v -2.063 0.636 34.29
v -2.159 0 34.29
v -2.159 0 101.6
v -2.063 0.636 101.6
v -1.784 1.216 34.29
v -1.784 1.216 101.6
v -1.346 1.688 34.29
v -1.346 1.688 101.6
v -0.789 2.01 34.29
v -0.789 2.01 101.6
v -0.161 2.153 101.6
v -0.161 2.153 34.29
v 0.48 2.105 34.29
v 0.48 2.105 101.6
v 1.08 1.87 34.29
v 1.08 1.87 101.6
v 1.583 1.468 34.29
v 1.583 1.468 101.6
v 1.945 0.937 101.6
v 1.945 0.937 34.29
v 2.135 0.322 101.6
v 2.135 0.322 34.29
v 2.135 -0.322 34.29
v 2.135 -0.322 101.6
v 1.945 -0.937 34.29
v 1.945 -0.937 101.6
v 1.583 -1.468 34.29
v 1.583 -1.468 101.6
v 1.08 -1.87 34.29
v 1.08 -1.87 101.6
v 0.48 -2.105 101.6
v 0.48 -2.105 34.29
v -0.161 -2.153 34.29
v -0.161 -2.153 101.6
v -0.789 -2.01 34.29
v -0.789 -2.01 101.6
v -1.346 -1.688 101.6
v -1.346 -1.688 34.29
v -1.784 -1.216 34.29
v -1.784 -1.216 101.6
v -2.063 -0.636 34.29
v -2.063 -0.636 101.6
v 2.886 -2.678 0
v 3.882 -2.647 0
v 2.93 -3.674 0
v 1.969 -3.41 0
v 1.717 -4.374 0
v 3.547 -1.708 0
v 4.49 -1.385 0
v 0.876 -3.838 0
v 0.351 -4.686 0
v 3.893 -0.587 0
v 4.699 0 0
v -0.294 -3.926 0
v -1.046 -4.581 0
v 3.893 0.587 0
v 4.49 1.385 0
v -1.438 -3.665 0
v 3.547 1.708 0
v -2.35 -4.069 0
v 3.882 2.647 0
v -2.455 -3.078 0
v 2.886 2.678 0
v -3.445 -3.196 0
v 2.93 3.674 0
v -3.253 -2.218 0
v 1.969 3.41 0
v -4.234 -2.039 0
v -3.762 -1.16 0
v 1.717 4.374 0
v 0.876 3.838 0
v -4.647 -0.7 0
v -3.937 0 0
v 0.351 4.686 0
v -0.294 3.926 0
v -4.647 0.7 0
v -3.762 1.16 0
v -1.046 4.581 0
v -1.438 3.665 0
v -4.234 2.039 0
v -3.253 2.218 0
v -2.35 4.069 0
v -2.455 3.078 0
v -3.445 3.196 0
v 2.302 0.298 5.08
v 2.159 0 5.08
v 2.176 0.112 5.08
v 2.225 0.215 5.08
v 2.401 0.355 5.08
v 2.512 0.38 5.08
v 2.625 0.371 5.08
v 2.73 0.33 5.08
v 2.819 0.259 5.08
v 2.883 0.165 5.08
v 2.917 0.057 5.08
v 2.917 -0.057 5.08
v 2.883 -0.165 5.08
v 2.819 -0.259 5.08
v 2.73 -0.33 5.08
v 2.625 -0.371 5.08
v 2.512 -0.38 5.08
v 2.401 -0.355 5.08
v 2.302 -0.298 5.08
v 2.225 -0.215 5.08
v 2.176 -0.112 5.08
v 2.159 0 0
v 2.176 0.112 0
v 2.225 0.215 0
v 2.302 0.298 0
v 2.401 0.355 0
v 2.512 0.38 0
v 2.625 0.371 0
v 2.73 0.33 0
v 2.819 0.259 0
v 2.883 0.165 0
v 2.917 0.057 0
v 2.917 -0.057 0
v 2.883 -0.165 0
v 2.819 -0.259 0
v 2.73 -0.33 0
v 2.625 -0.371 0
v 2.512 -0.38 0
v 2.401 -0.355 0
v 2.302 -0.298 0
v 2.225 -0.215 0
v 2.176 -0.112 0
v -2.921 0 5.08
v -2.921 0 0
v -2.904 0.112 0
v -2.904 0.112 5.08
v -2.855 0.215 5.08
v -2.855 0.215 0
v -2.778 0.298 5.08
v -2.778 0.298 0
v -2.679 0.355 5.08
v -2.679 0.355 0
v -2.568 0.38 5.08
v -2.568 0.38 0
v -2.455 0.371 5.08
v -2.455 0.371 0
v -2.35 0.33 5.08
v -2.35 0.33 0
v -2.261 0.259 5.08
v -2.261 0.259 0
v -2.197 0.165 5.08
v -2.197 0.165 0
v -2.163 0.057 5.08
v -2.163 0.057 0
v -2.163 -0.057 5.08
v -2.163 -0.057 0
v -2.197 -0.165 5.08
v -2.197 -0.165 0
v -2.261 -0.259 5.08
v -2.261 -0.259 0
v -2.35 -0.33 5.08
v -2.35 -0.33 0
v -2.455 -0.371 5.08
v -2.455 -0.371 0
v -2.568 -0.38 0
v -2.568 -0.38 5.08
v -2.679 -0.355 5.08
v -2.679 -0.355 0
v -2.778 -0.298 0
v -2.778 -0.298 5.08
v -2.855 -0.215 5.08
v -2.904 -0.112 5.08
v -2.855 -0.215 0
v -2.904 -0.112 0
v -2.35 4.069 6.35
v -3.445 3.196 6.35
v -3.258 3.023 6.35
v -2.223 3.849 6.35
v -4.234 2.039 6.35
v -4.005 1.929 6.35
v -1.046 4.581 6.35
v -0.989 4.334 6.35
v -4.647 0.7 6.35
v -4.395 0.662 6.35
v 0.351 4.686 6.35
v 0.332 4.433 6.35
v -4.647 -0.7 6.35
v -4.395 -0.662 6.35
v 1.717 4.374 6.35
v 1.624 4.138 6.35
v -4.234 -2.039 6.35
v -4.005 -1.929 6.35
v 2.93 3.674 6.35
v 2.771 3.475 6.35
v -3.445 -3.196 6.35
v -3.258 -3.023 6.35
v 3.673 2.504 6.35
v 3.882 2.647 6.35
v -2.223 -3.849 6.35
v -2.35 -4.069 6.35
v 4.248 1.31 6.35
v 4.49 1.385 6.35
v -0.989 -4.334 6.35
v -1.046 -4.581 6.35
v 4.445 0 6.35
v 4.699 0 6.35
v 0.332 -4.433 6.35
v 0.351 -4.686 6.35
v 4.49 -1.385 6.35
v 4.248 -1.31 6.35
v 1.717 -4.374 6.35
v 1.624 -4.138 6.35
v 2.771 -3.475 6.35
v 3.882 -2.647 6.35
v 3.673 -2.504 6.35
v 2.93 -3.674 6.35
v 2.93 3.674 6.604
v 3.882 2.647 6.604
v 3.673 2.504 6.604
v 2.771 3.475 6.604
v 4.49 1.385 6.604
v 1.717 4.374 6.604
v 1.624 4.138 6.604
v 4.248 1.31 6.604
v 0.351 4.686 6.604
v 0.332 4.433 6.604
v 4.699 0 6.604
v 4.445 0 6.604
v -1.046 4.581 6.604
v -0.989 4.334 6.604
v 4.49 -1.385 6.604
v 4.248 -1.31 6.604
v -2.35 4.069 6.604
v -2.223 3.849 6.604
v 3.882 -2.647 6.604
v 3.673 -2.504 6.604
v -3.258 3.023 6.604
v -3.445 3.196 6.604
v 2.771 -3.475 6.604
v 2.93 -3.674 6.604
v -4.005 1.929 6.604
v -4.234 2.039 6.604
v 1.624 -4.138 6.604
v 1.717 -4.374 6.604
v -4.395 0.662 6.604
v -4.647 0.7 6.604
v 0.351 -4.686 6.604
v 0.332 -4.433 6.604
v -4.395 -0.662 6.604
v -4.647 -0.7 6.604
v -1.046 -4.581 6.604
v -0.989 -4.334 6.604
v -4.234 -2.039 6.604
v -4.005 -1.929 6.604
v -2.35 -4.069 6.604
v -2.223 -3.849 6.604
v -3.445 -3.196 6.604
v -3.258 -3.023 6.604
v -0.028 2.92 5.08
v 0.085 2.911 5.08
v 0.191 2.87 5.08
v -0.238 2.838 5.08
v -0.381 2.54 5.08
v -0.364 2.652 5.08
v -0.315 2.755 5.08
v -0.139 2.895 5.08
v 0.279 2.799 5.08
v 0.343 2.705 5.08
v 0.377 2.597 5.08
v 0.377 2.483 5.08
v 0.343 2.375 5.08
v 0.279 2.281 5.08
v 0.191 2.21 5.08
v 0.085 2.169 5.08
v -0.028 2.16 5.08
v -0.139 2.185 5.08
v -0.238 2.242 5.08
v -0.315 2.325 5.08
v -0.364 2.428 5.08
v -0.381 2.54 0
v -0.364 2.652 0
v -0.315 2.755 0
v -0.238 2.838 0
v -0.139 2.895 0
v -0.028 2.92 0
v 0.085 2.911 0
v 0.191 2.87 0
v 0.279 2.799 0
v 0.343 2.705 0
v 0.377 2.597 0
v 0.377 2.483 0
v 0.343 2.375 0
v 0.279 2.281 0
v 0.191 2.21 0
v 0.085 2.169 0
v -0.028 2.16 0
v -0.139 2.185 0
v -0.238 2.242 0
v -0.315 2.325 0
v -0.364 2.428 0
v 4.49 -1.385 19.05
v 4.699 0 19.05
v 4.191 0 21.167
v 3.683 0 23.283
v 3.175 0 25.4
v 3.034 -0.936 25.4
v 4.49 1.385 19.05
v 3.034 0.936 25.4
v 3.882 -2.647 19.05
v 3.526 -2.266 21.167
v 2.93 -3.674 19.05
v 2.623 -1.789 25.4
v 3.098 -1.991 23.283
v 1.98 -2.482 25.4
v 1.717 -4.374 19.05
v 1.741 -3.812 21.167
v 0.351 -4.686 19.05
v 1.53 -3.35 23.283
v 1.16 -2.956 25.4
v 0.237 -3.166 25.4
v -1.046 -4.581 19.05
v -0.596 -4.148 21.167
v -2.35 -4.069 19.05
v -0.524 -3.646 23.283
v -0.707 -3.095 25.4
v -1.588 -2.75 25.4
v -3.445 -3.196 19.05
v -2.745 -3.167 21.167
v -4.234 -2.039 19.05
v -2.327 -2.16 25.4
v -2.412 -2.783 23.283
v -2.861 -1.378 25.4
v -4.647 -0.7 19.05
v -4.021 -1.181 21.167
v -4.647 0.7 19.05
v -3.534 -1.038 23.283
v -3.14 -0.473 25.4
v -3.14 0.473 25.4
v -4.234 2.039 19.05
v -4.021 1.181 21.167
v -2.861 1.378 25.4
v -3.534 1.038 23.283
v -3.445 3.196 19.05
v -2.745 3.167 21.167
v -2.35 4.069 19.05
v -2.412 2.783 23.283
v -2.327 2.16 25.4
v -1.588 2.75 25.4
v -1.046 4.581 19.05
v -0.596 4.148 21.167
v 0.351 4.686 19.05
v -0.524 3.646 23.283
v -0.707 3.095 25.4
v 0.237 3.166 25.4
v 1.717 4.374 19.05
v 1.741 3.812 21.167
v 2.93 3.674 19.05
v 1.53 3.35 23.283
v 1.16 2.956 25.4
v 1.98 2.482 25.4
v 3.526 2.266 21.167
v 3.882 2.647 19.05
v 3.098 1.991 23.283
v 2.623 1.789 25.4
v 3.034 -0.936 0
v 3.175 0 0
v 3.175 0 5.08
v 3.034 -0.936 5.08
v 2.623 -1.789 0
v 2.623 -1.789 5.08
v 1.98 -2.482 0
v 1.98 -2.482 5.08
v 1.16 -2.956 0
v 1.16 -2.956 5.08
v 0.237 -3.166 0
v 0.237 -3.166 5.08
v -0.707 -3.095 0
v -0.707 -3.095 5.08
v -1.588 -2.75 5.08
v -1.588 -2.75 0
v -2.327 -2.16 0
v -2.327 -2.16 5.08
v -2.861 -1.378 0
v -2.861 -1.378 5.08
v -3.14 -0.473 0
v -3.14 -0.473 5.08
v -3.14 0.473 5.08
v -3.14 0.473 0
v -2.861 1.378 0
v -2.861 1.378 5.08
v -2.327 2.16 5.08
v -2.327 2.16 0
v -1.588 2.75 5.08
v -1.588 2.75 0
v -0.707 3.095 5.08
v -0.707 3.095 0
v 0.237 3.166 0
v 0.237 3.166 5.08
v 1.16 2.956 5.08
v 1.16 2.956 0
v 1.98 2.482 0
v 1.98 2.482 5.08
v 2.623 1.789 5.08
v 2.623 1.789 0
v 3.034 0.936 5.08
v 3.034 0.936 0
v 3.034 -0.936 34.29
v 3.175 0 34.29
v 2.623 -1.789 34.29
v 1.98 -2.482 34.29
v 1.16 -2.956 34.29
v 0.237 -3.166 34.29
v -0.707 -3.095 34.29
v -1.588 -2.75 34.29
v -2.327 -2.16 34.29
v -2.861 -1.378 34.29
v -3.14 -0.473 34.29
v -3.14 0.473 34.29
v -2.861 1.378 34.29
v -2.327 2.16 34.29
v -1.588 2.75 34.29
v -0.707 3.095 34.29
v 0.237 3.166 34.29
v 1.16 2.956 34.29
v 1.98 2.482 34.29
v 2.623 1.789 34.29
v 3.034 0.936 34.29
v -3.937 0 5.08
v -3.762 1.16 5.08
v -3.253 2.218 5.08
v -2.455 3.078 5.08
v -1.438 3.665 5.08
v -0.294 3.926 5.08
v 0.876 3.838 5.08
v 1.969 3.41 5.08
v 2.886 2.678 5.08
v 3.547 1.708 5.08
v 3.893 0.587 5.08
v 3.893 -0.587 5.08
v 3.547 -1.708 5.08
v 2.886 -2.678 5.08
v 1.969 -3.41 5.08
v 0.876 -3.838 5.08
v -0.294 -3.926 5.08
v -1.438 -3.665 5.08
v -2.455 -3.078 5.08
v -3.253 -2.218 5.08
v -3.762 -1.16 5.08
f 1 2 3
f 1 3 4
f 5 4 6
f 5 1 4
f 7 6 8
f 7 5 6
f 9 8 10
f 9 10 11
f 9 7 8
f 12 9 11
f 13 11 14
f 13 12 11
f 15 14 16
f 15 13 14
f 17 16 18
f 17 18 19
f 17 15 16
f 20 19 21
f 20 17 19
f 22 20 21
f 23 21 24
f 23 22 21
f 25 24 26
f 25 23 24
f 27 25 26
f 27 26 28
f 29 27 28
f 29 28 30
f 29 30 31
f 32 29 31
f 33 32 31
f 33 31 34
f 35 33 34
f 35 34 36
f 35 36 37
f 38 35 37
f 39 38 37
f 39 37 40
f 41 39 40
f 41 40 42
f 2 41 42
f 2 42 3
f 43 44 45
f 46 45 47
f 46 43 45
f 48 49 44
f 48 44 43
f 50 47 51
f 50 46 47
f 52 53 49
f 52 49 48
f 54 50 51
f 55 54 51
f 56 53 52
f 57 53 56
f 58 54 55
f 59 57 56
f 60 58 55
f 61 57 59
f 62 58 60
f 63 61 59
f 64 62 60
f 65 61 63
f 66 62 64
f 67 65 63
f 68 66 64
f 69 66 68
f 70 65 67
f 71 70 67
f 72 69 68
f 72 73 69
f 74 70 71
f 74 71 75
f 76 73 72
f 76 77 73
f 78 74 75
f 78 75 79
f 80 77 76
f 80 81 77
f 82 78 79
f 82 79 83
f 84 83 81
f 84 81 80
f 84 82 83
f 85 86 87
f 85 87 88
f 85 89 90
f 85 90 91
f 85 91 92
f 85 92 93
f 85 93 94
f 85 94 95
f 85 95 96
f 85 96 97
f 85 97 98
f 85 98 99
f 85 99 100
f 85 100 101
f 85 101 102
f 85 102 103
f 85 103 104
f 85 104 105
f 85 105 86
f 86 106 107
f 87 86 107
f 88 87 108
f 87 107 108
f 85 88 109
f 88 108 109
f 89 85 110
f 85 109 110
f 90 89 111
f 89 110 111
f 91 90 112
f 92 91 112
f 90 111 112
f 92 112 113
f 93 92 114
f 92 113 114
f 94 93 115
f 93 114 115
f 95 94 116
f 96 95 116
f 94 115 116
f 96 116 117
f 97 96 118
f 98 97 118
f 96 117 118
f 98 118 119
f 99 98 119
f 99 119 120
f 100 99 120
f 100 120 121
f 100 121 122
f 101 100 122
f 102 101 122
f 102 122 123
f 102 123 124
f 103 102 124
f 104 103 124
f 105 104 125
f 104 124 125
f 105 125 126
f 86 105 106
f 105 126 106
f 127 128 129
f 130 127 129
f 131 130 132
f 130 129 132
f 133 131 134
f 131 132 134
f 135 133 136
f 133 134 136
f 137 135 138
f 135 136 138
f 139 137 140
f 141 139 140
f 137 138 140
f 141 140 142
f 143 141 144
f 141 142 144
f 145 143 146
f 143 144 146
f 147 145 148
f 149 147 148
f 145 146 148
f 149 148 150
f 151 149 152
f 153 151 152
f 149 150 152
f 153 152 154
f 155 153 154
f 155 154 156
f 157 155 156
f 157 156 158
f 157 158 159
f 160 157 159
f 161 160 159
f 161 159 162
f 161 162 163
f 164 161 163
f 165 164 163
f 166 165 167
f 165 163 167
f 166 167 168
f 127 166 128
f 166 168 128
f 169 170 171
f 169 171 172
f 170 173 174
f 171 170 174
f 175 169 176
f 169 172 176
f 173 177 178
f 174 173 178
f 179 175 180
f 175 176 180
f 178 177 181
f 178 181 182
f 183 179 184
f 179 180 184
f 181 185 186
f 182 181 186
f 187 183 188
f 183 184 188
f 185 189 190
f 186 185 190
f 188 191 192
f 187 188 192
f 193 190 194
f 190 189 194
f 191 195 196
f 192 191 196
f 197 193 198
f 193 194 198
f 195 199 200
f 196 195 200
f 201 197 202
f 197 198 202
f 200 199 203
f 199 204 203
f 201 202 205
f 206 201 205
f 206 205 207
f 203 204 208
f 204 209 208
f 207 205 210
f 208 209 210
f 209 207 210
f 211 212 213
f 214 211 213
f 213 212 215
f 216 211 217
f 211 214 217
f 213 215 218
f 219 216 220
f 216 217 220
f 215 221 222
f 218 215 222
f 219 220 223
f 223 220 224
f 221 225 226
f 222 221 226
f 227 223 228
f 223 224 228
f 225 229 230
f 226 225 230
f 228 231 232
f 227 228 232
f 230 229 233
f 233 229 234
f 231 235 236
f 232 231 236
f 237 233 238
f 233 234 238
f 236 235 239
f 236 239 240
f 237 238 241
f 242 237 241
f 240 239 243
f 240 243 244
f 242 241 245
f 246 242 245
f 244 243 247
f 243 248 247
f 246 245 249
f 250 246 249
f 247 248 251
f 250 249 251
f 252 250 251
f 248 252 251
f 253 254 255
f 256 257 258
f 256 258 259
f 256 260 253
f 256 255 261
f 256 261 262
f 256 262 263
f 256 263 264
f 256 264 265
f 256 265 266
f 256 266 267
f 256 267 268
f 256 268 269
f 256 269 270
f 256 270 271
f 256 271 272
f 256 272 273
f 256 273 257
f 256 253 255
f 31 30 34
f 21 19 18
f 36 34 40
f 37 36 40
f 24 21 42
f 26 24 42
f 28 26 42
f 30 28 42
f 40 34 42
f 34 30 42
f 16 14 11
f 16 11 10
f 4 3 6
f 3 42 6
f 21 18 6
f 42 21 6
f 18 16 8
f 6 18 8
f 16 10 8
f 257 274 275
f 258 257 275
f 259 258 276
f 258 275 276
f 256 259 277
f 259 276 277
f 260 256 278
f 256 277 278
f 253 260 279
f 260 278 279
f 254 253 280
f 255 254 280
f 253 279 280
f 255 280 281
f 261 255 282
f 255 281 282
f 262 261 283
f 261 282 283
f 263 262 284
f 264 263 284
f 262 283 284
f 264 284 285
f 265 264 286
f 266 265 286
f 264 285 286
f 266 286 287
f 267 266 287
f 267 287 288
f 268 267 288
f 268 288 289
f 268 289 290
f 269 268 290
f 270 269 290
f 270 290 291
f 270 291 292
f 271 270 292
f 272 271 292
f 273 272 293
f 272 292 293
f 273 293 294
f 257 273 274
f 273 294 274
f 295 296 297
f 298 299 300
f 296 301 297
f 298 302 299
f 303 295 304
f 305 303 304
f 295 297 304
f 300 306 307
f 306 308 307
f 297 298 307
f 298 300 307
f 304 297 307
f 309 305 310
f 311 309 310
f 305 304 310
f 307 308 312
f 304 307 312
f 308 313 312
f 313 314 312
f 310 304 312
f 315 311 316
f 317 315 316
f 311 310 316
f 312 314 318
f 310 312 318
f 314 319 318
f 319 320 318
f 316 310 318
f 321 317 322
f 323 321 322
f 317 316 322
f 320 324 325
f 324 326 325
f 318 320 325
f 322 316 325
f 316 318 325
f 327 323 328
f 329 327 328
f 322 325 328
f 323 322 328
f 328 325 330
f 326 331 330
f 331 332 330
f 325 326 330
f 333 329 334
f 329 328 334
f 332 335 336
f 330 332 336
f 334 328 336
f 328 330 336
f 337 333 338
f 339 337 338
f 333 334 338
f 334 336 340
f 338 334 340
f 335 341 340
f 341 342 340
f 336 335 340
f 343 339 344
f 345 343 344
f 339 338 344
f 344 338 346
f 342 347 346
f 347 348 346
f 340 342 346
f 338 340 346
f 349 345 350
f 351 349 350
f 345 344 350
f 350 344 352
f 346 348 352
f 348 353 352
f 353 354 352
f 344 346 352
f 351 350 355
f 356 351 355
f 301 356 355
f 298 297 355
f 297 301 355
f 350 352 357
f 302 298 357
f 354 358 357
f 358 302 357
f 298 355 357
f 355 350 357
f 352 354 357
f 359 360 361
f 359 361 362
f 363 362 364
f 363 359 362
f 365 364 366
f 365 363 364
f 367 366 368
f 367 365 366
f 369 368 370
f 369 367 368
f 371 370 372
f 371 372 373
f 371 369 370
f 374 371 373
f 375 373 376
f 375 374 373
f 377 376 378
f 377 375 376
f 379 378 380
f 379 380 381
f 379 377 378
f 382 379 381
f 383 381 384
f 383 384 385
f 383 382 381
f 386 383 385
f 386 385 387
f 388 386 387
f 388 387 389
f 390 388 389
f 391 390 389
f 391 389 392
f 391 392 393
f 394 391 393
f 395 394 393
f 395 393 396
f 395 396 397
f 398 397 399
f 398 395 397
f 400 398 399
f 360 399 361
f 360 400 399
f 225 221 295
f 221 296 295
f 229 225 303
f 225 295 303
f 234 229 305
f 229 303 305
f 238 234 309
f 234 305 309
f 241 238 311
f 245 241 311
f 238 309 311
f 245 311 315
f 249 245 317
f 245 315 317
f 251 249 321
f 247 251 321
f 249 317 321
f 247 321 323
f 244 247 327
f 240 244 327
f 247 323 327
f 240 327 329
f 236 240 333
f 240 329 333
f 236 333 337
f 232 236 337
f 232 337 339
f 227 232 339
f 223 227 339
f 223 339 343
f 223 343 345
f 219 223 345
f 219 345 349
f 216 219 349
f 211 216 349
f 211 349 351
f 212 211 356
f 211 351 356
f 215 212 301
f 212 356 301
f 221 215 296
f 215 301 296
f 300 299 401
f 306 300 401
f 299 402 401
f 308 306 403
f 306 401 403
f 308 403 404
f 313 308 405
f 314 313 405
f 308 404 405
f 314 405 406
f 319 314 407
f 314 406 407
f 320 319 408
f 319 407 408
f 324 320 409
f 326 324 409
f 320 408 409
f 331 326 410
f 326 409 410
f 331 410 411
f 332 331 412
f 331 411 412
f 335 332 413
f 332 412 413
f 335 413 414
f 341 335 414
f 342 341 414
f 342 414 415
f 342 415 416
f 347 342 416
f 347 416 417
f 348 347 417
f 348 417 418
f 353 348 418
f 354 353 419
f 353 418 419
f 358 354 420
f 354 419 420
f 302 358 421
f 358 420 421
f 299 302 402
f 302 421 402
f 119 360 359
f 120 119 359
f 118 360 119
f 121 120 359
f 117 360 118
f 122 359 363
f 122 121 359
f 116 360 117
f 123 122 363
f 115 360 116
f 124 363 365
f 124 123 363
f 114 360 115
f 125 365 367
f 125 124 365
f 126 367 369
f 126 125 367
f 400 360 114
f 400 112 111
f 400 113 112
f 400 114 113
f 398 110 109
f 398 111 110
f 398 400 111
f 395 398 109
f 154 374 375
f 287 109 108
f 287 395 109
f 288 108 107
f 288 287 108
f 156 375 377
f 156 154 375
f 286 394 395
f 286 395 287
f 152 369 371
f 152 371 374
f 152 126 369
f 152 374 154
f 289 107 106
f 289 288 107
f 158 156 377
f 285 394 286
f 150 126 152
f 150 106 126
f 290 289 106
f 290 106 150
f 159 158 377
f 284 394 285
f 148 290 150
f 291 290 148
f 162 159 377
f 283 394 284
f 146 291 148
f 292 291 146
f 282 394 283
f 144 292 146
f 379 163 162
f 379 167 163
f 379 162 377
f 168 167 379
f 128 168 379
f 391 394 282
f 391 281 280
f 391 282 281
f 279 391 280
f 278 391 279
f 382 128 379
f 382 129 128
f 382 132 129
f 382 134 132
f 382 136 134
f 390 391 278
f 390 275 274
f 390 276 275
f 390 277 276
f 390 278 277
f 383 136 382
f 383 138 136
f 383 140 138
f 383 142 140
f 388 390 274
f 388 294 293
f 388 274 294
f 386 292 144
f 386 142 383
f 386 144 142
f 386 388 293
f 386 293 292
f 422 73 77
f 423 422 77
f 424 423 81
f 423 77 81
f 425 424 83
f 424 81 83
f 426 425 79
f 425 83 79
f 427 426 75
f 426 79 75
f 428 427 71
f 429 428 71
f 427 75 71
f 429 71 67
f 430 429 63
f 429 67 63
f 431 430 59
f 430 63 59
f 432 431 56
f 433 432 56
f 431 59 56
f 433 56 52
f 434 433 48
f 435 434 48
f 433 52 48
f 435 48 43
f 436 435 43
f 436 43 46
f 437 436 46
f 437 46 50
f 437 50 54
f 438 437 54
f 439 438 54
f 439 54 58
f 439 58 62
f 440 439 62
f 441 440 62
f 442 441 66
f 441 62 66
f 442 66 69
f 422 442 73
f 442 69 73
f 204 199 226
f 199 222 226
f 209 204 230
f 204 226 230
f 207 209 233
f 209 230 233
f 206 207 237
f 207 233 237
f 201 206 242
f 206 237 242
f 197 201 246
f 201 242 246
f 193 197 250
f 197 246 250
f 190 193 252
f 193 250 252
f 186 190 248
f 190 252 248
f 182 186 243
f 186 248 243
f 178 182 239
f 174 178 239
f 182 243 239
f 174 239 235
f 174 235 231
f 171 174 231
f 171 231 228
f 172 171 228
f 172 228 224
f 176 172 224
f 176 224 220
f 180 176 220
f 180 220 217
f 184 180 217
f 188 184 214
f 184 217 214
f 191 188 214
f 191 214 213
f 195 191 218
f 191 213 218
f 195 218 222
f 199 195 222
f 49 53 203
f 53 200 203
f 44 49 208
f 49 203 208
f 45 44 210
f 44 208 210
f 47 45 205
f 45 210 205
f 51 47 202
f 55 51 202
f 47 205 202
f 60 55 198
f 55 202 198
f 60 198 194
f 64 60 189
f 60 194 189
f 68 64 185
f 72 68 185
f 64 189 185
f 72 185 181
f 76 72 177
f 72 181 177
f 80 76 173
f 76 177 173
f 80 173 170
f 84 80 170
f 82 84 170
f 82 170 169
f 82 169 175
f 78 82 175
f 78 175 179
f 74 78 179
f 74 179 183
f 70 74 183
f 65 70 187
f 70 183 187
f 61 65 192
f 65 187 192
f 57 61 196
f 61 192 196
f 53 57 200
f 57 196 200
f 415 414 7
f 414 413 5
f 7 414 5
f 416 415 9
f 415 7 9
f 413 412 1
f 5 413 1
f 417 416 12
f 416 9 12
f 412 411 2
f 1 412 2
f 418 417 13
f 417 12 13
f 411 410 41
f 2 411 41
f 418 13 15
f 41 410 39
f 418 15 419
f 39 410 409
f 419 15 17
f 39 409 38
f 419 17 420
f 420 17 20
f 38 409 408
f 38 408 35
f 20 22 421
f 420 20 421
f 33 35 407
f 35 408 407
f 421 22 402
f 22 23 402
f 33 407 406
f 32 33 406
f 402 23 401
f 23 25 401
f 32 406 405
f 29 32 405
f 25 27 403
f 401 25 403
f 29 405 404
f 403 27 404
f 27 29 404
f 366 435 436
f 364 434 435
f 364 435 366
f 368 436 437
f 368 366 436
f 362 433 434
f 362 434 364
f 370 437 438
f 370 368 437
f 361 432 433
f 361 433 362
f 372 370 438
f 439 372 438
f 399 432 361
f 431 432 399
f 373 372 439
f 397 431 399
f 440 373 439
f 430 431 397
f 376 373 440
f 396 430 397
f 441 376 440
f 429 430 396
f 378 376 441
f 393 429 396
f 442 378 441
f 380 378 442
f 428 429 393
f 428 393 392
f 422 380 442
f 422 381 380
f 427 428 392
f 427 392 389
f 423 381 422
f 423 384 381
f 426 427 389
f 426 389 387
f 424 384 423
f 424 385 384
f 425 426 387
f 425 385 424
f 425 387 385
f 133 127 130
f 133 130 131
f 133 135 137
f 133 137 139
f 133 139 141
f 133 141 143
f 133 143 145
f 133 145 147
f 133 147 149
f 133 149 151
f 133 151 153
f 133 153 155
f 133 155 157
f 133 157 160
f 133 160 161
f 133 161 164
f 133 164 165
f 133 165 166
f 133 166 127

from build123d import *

# Parameters (mm, degrees)
SKETCH2_R          = 2.159
EXTRUDE1_DEPTH     = 101.6
SKETCH4_R          = 3.937
SKETCH4_R_2        = 3.175
SKETCH4_R_3        = 0.381
CUT_EXTRUDE2_DEPTH = 5.08


with BuildPart() as part:
    # S2D0001 → Revolve1 (revolve)
    with BuildSketch(Plane(origin=(0, 0, 0), x_dir=(0, 0, -1), z_dir=(1, 0, 0)), mode=Mode.PRIVATE) as revolve1_sk:
        Polygon((0, 0), (0, 4.699), (-6.35, 4.699), (-6.35, 4.445), (-6.604, 4.445), (-6.604, 4.699), (-19.05, 4.699), (-25.4, 3.175), (-34.29, 3.175), (-34.29, 0), align=None)
    revolve(revolve1_sk.sketch.rotate(Axis((0, 0, 36.0045), (0, 0, -1)), 90), axis=Axis((0, 0, 36.0045), (0, 0, -1)))  # turned: the seam where the file's is

    # Sketch2 → Extrude1 (add)
    with BuildSketch(Plane(origin=(0, 0, 0), x_dir=(-1, 0, 0), z_dir=(0, 0, -1))):
        Circle(SKETCH2_R)
    extrude(amount=-EXTRUDE1_DEPTH)

    # Sketch4 → Cut-Extrude2 (cut)
    with BuildSketch(Plane(origin=(0, 0, 0), x_dir=(-1, 0, 0), z_dir=(0, 0, -1))):
        Circle(SKETCH4_R)
        with Locations(Location((0, 0, 0), (0, 0, 180))):  # turned: the seam where the file's is
            Circle(SKETCH4_R_2, mode=Mode.SUBTRACT)
        with Locations((0, 2.54)):
            Circle(SKETCH4_R_3)
        with Locations((2.54, 0)):
            Circle(SKETCH4_R_3)
        with Locations((-2.54, 0)):
            Circle(SKETCH4_R_3)
    extrude(amount=-CUT_EXTRUDE2_DEPTH, mode=Mode.SUBTRACT)


solid = part.part
